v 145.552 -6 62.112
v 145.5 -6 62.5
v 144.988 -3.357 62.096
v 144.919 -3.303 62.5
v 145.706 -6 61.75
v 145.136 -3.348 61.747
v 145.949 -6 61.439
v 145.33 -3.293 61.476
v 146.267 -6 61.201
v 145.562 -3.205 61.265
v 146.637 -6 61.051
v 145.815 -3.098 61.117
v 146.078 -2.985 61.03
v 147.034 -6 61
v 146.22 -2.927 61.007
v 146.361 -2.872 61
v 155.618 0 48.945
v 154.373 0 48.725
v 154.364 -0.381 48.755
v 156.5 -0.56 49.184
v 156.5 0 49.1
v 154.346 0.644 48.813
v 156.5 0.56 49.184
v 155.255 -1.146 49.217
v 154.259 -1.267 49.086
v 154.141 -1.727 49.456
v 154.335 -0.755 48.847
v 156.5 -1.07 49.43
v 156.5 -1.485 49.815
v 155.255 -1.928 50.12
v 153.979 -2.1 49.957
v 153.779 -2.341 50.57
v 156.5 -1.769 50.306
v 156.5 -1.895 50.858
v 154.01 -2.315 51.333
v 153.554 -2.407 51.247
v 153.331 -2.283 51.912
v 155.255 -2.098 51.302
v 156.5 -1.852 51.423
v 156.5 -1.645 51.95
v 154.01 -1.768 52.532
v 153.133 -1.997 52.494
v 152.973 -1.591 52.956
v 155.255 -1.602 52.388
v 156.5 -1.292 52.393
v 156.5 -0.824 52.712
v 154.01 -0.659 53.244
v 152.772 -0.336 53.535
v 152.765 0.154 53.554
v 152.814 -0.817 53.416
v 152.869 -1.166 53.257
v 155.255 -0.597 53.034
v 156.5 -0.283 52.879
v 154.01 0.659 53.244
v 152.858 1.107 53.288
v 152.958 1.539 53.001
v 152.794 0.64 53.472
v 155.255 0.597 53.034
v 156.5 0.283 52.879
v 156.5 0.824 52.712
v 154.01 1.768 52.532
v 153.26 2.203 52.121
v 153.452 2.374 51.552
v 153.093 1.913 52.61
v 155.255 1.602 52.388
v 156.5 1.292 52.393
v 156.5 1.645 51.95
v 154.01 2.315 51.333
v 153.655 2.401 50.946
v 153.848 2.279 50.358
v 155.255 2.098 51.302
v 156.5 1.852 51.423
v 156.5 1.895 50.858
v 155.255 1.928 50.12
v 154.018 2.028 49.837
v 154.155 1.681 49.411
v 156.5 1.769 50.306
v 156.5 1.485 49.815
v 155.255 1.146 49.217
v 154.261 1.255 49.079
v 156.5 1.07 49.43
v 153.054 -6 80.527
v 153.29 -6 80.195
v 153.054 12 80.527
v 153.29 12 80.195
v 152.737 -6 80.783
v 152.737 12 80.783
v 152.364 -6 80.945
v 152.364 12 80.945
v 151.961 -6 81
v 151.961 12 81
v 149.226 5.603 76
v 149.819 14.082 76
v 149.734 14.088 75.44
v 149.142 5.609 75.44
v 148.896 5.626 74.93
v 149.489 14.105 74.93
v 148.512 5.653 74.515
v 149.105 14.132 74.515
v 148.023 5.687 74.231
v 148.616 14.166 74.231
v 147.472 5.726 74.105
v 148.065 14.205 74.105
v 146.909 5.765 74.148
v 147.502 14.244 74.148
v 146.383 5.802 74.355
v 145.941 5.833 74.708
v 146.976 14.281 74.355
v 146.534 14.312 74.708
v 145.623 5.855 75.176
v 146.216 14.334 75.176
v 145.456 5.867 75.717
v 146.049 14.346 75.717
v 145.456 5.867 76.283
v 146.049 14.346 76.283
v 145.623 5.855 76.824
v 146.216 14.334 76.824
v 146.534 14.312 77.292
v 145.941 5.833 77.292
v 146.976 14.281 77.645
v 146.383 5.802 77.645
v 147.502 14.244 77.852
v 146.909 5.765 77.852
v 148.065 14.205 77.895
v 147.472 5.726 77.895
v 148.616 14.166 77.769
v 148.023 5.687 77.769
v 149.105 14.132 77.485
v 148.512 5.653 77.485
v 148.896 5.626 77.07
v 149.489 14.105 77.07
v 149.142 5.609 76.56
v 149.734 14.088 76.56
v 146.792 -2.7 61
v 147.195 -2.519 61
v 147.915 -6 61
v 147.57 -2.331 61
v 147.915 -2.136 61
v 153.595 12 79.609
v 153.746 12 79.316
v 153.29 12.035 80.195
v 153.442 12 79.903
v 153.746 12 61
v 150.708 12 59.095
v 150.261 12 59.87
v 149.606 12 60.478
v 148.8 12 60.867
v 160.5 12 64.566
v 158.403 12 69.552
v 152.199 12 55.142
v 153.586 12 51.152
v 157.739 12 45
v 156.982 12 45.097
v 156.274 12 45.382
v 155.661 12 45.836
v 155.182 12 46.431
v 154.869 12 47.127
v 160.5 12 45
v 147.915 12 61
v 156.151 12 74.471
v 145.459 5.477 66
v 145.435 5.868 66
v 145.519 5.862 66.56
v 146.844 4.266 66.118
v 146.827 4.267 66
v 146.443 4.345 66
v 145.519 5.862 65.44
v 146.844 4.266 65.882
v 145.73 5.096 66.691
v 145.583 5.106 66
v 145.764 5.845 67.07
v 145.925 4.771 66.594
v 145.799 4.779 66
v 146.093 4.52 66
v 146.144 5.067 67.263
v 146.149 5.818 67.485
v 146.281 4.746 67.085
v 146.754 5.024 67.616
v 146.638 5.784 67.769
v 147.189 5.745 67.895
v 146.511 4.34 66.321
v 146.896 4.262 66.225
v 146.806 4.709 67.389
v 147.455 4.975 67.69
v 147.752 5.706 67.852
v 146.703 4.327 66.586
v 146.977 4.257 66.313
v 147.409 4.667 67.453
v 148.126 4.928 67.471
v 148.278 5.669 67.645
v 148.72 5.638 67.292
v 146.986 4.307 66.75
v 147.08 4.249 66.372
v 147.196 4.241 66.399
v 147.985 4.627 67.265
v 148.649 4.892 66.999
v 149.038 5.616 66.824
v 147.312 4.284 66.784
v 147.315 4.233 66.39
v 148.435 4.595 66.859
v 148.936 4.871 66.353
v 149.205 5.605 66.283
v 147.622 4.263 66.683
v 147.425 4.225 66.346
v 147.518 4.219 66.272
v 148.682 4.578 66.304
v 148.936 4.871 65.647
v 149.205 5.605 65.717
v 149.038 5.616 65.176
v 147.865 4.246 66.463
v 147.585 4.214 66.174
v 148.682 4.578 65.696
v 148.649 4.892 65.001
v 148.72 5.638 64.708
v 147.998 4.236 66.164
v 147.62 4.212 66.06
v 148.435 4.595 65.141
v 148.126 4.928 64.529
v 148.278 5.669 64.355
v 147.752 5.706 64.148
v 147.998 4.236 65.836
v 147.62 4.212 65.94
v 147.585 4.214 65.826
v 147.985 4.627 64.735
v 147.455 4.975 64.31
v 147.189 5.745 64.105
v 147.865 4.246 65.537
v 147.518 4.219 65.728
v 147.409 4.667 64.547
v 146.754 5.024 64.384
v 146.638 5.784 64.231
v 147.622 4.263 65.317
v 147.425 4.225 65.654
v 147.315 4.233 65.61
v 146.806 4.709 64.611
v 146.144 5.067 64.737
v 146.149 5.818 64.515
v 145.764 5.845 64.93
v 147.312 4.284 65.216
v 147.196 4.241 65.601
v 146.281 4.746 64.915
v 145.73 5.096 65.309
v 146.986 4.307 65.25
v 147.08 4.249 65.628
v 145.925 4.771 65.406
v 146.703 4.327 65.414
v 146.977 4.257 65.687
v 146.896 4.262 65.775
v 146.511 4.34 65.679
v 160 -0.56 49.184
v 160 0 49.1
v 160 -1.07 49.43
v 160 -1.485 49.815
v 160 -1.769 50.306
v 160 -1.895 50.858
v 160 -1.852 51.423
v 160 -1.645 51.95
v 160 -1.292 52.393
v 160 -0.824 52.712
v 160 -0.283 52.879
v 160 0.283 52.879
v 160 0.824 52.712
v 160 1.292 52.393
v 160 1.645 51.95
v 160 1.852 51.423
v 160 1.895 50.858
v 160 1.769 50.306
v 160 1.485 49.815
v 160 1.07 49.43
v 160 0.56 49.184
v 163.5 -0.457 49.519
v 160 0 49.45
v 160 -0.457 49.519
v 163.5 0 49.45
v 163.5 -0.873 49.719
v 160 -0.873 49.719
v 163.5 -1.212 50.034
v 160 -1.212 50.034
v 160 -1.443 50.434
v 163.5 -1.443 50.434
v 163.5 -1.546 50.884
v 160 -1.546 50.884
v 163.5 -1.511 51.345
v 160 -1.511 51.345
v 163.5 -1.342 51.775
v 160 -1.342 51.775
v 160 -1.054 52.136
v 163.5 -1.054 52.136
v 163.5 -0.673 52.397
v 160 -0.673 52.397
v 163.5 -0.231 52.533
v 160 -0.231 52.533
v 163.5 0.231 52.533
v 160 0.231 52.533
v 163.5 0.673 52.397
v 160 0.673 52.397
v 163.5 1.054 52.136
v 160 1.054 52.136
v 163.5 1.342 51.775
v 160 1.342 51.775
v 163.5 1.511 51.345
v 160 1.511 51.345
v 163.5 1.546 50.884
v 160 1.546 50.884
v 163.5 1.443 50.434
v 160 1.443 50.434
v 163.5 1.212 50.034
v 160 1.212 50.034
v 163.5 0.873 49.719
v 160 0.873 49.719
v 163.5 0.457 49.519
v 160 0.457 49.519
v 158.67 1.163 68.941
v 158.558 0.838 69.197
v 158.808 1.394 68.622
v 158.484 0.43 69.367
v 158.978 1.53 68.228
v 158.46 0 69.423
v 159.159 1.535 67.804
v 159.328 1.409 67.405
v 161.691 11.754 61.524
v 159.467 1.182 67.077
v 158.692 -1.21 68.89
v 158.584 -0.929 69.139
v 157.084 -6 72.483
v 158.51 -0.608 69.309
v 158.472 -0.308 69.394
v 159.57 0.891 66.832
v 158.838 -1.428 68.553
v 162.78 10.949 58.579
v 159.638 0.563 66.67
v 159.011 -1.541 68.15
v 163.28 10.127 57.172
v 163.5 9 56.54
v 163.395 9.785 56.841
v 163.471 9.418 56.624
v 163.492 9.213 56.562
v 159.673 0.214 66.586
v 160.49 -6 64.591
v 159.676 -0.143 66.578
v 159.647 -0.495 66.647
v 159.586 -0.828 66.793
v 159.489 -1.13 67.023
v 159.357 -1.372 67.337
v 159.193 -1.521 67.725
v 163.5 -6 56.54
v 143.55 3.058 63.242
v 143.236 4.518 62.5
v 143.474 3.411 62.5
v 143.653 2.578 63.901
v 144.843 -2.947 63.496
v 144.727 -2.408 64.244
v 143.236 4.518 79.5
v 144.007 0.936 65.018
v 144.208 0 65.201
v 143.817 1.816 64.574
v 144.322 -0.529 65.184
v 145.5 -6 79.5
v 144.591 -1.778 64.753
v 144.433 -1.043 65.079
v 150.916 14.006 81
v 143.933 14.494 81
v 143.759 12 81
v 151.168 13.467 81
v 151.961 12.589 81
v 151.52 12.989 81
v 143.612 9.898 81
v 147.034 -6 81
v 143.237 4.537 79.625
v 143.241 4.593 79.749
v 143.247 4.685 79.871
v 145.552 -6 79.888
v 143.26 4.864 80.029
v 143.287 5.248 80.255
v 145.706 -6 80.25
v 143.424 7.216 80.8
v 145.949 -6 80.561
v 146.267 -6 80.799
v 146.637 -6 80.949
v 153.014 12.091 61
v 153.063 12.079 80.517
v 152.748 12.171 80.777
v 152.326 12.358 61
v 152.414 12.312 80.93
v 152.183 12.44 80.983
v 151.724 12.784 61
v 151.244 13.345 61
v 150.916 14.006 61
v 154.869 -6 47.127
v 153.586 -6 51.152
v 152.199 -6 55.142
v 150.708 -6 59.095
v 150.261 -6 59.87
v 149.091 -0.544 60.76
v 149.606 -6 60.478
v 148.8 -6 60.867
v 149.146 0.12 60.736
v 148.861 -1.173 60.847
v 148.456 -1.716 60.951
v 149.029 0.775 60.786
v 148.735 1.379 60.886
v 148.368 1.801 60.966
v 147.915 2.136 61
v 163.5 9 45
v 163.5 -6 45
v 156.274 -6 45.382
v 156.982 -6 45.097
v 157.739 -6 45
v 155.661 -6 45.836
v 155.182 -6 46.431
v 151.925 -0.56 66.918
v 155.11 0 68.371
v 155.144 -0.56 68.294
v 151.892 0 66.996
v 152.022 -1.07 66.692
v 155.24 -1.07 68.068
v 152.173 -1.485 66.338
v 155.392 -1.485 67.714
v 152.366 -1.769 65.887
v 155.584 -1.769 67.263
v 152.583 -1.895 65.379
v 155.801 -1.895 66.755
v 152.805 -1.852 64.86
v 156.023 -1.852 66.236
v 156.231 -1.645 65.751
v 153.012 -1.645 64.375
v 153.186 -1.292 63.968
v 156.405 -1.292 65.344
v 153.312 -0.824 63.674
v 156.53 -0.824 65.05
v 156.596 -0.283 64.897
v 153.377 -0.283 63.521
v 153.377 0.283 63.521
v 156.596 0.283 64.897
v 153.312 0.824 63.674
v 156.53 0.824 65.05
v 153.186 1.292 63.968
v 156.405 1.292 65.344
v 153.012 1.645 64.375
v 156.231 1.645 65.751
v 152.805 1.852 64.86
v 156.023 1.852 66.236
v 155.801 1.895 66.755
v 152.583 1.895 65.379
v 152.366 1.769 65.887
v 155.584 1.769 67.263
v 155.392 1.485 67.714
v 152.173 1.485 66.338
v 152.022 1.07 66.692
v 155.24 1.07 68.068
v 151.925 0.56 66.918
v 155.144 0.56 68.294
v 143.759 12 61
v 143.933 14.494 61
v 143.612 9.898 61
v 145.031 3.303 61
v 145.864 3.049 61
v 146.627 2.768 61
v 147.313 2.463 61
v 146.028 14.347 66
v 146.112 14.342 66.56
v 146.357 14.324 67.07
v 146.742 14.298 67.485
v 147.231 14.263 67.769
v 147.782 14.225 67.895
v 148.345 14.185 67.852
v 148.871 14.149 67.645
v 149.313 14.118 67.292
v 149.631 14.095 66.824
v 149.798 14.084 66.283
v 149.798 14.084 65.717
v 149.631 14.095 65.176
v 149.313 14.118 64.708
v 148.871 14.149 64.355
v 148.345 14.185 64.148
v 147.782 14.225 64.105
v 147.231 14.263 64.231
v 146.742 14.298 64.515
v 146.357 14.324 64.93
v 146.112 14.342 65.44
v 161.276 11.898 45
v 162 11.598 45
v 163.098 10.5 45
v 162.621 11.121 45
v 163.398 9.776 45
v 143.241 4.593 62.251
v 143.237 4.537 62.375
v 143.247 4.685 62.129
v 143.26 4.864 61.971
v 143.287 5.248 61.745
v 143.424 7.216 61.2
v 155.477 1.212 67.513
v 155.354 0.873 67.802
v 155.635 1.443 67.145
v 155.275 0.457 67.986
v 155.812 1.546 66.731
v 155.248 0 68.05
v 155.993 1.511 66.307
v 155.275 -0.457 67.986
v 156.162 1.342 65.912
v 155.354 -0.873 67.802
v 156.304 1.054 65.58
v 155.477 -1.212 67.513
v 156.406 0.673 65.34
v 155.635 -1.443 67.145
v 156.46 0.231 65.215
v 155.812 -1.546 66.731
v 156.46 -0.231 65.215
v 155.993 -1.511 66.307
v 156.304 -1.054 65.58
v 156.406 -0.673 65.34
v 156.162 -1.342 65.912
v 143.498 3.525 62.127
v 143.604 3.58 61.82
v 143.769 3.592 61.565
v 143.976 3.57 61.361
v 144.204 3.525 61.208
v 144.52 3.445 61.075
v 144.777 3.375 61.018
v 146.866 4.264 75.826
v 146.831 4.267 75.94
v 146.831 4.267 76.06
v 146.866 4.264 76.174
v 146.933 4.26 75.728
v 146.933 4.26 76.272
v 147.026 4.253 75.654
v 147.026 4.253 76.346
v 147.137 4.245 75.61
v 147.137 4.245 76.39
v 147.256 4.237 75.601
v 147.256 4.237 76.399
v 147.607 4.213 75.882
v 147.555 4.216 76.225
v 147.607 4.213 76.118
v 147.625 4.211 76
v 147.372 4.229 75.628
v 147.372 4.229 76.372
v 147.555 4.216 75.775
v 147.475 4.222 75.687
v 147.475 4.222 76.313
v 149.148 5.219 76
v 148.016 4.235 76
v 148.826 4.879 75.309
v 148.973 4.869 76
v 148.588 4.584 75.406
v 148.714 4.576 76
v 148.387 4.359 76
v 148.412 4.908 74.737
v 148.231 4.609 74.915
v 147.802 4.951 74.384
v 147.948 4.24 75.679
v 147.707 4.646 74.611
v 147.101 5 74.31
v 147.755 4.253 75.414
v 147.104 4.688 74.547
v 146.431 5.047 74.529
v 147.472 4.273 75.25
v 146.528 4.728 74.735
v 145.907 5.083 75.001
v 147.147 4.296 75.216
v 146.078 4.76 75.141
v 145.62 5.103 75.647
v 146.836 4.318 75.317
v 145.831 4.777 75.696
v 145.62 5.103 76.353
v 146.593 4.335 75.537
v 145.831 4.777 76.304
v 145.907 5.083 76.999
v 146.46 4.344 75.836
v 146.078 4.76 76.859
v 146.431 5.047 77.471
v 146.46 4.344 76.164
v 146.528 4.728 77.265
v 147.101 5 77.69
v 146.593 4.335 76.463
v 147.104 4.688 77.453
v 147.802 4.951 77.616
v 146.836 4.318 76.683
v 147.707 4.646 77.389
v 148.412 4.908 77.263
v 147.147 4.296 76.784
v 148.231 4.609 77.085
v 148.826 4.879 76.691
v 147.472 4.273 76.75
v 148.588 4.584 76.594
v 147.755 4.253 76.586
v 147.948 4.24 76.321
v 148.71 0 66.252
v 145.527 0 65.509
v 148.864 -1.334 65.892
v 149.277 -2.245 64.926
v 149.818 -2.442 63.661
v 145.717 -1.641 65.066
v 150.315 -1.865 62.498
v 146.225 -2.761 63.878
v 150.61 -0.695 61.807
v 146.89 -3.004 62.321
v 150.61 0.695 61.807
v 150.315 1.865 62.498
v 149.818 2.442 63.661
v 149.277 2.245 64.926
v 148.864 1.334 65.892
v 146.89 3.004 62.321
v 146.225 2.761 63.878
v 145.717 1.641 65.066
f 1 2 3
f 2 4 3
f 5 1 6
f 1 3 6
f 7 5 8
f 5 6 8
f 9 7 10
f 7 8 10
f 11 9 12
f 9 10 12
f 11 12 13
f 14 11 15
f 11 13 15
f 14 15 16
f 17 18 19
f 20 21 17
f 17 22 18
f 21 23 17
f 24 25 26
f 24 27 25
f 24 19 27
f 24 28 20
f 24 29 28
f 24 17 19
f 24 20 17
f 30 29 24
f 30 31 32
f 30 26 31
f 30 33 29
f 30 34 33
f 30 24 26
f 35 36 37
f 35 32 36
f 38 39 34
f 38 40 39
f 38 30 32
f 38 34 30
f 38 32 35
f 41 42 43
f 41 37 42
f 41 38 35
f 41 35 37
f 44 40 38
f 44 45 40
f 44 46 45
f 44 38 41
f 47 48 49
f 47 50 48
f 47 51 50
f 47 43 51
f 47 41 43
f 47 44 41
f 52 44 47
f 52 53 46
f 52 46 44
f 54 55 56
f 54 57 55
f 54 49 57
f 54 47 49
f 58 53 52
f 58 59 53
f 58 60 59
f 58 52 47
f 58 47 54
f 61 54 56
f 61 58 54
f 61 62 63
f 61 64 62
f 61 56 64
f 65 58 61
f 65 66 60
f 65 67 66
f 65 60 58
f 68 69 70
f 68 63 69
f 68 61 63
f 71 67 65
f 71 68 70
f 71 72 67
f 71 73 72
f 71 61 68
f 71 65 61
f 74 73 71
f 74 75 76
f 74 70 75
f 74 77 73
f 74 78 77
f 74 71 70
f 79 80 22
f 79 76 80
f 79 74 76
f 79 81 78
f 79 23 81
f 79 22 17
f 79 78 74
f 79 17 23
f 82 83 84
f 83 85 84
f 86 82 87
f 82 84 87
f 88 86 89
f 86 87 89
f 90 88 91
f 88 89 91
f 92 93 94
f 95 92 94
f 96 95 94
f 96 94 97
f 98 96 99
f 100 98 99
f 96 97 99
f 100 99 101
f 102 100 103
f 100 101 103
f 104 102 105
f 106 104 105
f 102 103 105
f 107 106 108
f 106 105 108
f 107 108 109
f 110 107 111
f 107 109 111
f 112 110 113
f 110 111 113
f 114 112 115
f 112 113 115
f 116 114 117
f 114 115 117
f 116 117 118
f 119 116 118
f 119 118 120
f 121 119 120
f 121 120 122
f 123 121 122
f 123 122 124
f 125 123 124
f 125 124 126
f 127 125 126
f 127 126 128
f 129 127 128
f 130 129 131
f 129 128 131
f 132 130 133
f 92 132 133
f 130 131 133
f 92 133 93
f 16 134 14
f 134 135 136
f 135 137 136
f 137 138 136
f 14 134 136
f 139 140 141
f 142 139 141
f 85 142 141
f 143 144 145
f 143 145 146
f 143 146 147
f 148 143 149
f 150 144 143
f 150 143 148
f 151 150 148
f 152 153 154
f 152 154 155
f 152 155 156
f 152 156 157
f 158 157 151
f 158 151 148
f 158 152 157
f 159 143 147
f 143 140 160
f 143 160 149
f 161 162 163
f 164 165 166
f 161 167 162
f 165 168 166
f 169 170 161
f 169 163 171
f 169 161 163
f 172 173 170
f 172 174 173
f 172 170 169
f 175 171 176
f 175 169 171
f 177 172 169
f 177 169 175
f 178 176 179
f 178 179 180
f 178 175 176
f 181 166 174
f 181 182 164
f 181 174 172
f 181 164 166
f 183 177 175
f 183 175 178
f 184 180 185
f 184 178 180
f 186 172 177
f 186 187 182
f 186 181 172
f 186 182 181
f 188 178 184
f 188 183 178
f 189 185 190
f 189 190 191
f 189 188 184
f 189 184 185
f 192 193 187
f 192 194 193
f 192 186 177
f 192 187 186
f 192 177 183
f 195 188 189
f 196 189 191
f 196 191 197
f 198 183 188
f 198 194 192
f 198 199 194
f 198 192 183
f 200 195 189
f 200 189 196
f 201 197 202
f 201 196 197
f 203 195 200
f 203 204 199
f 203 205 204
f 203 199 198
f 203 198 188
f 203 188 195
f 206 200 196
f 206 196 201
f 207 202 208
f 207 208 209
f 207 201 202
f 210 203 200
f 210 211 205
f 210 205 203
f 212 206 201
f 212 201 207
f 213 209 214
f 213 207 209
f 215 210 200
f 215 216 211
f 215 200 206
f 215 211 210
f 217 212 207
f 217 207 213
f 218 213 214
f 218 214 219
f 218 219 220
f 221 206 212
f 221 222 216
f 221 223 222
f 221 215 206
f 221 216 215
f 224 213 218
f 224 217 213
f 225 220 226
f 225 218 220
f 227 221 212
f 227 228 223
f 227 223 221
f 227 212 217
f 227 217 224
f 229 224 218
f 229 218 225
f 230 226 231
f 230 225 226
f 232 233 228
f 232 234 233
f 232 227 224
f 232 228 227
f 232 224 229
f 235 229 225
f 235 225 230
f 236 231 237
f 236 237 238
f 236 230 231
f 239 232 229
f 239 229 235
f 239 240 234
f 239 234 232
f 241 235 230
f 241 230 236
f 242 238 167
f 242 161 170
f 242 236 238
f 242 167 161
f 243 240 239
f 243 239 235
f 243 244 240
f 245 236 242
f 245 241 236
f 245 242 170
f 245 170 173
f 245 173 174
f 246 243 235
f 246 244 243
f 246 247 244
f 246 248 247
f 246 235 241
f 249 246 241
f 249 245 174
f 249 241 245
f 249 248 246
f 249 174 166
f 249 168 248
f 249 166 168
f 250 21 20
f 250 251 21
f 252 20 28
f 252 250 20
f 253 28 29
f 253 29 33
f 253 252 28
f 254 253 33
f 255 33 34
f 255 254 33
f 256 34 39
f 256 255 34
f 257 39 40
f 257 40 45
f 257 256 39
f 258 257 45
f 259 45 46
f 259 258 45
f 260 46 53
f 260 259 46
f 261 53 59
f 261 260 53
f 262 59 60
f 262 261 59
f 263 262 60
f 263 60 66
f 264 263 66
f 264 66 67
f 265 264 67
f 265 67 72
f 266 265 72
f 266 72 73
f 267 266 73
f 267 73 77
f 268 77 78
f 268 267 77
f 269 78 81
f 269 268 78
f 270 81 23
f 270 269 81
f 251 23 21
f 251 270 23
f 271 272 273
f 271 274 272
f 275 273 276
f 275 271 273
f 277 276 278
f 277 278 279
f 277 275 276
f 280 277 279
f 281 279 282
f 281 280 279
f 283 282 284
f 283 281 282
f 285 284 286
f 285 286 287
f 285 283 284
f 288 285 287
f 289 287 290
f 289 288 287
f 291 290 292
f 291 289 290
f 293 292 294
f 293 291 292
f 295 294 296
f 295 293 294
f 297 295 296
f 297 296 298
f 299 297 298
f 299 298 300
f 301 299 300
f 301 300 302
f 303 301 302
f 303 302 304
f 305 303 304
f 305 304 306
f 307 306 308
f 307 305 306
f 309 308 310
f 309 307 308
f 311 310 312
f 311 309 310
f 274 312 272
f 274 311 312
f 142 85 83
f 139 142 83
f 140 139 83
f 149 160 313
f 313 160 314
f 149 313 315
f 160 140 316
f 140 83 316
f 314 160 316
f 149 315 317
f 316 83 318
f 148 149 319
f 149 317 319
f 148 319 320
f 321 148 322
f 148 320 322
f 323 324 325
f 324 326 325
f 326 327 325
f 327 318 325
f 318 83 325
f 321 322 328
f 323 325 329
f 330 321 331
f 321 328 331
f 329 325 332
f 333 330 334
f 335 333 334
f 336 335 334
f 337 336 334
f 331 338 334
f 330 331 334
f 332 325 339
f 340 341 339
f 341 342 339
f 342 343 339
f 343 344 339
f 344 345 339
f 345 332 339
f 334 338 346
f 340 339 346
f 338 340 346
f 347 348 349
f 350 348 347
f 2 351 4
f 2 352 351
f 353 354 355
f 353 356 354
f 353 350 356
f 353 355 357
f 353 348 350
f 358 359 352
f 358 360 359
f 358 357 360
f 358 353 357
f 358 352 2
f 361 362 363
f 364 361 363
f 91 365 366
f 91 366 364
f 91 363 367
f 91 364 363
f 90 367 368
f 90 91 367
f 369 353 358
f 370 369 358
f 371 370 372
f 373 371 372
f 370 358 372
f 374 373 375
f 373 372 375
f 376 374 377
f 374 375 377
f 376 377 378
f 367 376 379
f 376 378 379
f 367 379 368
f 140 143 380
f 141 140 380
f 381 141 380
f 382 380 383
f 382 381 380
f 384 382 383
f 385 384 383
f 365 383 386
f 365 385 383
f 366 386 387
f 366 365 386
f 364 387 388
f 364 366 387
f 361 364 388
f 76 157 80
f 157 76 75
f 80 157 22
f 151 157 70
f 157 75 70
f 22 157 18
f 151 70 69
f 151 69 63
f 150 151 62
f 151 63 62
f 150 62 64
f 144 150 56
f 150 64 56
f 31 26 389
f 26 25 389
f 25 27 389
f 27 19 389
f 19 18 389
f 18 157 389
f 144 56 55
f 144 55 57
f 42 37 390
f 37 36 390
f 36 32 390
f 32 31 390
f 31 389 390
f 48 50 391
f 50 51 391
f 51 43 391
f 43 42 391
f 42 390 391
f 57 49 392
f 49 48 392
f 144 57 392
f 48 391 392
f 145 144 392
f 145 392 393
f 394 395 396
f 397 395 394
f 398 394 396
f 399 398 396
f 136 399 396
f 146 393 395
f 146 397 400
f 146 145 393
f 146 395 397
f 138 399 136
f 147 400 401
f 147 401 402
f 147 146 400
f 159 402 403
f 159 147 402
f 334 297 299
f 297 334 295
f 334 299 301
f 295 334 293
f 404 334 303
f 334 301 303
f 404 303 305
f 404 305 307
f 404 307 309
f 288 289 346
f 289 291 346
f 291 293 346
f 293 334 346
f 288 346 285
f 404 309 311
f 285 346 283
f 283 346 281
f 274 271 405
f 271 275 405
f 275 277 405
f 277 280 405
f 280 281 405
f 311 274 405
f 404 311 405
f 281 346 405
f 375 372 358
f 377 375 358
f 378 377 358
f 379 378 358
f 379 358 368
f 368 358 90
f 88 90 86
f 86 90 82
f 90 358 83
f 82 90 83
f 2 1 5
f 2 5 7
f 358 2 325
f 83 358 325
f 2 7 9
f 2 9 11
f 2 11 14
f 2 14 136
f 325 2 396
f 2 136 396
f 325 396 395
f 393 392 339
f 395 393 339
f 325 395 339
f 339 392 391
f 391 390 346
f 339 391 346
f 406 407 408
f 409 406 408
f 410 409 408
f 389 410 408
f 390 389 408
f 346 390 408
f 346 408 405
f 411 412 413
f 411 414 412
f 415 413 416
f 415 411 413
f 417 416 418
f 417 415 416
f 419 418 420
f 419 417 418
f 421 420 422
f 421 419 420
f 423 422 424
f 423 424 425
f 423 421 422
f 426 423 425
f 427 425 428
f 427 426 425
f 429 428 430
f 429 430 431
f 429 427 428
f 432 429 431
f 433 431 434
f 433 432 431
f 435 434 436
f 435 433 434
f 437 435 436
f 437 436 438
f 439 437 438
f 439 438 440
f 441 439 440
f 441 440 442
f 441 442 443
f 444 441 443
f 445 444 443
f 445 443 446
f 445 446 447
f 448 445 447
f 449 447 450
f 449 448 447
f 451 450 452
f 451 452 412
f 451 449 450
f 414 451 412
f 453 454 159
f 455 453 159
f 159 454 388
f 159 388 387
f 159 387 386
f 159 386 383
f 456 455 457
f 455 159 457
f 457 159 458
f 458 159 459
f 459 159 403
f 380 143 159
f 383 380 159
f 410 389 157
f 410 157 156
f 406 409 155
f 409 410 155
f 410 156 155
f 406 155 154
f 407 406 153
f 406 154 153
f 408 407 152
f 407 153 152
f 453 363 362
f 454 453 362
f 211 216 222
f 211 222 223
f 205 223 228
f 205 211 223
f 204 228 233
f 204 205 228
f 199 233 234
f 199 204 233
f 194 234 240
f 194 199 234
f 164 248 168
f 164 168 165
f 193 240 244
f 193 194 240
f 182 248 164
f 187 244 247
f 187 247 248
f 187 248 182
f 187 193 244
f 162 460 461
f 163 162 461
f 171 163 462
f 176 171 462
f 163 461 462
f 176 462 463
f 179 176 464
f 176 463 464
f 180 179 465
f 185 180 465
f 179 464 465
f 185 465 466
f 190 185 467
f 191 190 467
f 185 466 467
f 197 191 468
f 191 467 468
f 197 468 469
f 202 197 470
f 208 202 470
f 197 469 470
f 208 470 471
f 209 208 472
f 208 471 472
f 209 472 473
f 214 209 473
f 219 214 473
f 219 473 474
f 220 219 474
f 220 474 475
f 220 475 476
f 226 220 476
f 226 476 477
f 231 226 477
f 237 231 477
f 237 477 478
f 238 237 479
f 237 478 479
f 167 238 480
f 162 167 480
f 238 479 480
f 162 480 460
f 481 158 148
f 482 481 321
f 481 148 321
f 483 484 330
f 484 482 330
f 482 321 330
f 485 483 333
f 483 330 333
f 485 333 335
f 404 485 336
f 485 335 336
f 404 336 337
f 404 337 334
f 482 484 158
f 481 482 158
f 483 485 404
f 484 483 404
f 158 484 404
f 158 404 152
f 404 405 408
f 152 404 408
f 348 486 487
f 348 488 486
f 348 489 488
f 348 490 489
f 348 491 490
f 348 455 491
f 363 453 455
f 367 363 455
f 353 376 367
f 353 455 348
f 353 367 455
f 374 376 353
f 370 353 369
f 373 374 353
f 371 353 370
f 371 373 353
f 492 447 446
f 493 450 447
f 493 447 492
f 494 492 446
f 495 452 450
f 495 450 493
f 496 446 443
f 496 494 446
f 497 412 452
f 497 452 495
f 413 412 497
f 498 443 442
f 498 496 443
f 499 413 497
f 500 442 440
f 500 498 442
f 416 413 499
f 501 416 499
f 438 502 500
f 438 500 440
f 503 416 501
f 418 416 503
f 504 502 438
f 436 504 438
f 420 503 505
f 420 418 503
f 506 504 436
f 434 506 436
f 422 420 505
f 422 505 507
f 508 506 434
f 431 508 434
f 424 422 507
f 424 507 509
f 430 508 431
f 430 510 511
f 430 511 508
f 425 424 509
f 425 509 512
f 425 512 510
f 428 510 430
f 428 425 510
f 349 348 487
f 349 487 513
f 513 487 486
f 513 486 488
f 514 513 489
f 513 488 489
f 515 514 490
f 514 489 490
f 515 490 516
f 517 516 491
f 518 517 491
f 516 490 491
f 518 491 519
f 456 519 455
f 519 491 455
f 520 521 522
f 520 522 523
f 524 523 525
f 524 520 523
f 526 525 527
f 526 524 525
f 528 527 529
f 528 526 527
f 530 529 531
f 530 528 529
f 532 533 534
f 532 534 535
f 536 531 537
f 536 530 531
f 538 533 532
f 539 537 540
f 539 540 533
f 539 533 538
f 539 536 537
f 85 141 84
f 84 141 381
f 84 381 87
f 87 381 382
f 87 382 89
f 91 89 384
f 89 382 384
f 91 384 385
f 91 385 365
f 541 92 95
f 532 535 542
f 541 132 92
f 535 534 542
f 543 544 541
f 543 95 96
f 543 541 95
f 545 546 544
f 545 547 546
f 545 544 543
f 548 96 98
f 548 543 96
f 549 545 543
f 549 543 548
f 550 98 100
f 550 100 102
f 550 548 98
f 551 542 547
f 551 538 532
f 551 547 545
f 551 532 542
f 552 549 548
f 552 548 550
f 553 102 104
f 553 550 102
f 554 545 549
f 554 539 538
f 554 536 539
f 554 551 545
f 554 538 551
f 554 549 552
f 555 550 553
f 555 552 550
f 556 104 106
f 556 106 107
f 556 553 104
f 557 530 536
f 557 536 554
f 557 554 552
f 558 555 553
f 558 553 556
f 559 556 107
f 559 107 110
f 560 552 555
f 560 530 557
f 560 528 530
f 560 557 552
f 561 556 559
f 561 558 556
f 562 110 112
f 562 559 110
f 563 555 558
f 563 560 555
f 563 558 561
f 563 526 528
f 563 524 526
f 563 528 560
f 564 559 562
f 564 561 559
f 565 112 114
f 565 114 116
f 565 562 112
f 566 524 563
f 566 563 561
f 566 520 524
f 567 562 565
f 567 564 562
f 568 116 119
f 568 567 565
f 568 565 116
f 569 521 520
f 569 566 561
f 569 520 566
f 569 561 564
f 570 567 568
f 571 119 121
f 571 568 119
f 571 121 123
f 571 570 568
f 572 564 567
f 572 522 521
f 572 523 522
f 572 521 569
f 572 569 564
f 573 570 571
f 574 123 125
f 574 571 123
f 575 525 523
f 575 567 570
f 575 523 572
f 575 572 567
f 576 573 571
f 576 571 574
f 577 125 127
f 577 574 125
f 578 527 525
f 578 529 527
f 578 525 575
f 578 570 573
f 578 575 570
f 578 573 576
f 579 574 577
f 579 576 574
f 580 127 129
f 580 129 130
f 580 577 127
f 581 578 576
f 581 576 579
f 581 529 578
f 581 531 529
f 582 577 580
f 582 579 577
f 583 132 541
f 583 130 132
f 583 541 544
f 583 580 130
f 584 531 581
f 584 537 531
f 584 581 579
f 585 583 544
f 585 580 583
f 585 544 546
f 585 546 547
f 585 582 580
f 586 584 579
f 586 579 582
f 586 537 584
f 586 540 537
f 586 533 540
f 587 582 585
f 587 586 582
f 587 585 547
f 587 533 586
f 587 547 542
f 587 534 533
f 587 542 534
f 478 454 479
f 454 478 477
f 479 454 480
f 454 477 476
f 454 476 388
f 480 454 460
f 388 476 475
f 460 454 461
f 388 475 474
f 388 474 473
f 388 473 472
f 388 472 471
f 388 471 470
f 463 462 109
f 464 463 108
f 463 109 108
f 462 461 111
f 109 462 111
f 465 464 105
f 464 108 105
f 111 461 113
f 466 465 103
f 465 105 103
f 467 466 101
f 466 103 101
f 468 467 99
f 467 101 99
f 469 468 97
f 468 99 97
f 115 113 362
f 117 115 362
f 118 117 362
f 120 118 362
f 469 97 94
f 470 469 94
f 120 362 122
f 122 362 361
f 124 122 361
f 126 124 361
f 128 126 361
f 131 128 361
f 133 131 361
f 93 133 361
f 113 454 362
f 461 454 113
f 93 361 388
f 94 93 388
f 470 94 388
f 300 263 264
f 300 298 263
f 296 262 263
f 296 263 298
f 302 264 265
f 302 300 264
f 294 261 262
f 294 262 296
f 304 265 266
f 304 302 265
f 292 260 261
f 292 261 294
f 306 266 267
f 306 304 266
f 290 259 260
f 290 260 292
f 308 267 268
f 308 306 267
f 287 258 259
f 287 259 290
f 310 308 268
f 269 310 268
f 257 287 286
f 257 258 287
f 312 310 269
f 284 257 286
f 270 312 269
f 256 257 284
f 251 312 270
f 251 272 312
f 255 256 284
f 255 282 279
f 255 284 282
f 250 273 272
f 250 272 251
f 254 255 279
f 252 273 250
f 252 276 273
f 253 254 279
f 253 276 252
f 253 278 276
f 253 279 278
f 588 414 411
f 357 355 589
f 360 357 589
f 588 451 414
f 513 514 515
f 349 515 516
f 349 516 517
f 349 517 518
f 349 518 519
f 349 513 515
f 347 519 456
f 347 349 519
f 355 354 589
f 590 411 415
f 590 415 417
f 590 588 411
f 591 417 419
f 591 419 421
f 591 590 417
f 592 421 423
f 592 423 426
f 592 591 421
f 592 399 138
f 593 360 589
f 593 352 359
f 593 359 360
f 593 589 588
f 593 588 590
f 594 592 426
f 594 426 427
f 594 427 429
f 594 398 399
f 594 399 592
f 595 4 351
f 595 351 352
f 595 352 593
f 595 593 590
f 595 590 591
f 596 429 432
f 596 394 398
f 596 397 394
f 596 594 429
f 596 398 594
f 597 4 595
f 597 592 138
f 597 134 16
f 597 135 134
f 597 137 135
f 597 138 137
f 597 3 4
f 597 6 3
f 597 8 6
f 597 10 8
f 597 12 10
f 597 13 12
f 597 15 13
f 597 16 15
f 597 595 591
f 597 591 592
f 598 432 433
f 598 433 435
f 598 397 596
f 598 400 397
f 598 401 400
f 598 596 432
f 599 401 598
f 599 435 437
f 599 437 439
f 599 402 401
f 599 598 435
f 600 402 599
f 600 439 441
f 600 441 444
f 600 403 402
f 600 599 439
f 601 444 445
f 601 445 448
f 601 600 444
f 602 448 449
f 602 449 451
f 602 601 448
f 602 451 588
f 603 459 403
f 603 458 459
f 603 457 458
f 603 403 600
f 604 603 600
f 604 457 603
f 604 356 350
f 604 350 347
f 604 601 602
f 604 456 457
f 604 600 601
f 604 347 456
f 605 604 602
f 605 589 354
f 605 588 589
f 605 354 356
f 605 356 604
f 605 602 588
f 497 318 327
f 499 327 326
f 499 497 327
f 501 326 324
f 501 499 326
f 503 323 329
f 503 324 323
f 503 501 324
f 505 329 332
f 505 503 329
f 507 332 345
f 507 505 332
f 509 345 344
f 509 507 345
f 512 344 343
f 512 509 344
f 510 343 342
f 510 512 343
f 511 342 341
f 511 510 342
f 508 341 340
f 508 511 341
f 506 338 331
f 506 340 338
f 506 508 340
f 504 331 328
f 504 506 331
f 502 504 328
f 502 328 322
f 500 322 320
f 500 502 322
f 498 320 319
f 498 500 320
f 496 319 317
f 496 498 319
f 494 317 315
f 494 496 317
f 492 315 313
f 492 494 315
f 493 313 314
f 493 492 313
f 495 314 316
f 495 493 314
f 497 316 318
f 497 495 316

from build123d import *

# Parameters (mm, degrees)
BOSS_EXTRU_1_DEPTH      = 12
BOSS_EXTRU_1_DEPTH_BACK = 6
ENL_V_MAT_EXTRU_1_DEPTH = 168.845911478
BOSS_EXTRU_2_DEPTH      = 20
ENL_V_MAT_EXTRU_2_DEPTH = 169.042623851
ESQUISSE5_R             = 1.9
ENL_V_MAT_EXTRU_3_DEPTH = 10
CONG_1_R                = 3
CONG_2_R                = 1.5


with BuildPart() as part:
    # Esquisse1 → Boss.-Extru.1 (new, two sides: drawn at the far end of the back side and taken through both)
    with BuildSketch(Plane(origin=(0, 0, 0), x_dir=(1, 0, 0), z_dir=(0, 1, 0)).offset(-BOSS_EXTRU_1_DEPTH_BACK)):
        with BuildLine():
            Line((142.5, -81), (152.865954352, -81))
            ThreePointArc((152.865954352, -81), (158.655064541, -68.975144042), (163.5, -56.539808984))
            Line((163.5, -56.539808984), (163.5, -45))
            Line((163.5, -45), (155.5, -45))
            ThreePointArc((155.5, -45), (152.933130519, -53.072663298), (149.947490809, -61))
            Line((149.947490809, -61), (142.5, -61))
            Line((142.5, -61), (142.5, -81))
        make_face()
    extrude(amount=BOSS_EXTRU_1_DEPTH + BOSS_EXTRU_1_DEPTH_BACK)

    # Esquisse2 → Enlèv. mat.-Extru.1 (cut, through all)
    with BuildSketch(Plane.XY.offset(81)):
        Polygon((142.5, -6), (142.5, 12), (143.758682615, 12), align=None)
    extrude(amount=-ENL_V_MAT_EXTRU_1_DEPTH, mode=Mode.SUBTRACT)

    # Esquisse3 → Boss.-Extru.2 (add)
    with BuildSketch(Plane.XY.offset(81)):
        Polygon((143.758682615, 12), (143.933073799, 14.493910126), (150.916022151, 14.005614809), (150.916022151, 12), align=None)
    extrude(amount=-BOSS_EXTRU_2_DEPTH)

    # Esquisse4 → Enlèv. mat.-Extru.2 (cut, through all)
    with BuildSketch(Plane.XY.offset(81)):
        Polygon((142.5, -6), (143.235509062, 4.518269623), (145.5, -6), align=None)
    extrude(amount=-ENL_V_MAT_EXTRU_2_DEPTH, mode=Mode.SUBTRACT)

    # Esquisse5 → Enlèv. mat.-Extru.3 (cut)
    with BuildSketch(Plane(origin=(1.708954599, 24.439189363, 0), x_dir=(0.9975640502598248, -0.06975647374411768, 0), z_dir=(0.06975647374411768, 0.9975640502598248, 0))):
        with Locations(Location((146.571416004, -66, 0), (0, 0, 180))):
            Circle(ESQUISSE5_R)
        with Locations((146.571416004, -76)):
            Circle(ESQUISSE5_R)
    extrude(amount=-ENL_V_MAT_EXTRU_3_DEPTH, mode=Mode.SUBTRACT)

    # Esquisse7 → Enlèvement de matière-Révolution1 (revolve, cut)
    with BuildSketch(Plane(origin=(0, 0, 0), x_dir=(1, 0, 0), z_dir=(0, 1, 0)), mode=Mode.PRIVATE) as enl_vement_de_mati_re_r_volution1_sk:
        Polygon((156.5, -52.9), (160, -52.9), (160, -52.55), (163.5, -52.55), (163.5, -51), (150.916022151, -51), (150.916022151, -53.884605954), align=None)
    revolve(enl_vement_de_mati_re_r_volution1_sk.sketch.rotate(Axis((150.916022151, 0, 51), (-1, 0, 0)), 180), axis=Axis((150.916022151, 0, 51), (-1, 0, 0)), mode=Mode.SUBTRACT)

    # Congé1
    # the kernel refuses this fillet: 3 mm, written as the material it adds along each edge
    with BuildSketch(Plane(origin=(150.916022151, 12, 81), x_dir=(0, 1, 0), z_dir=(0, 0, -1))) as cong_1_piece_1_section:
        with BuildLine():
            CenterArc((3, 2.830405994), CONG_1_R, 180, 70.642479406)
            Line((0, 2.830405994), (0, 0))
            Line((0, 0), (2.005614809, 0))
        make_face()
    cong_1_piece_1 = extrude(amount=20, mode=Mode.PRIVATE)
    cong_1_piece_1 = cong_1_piece_1 & Plane(origin=(0, 12, 0), x_dir=(0.8836182332495415, 0, 0.46820809248555173), z_dir=(0, -1, 0)) * Cylinder(173, 52, mode=Mode.PRIVATE)
    add(cong_1_piece_1)
    with BuildSketch(Plane(origin=(149.947490809, 12, 61), x_dir=(-1, 0, 0), z_dir=(0, -1, 0))) as cong_1_piece_2:
        with BuildLine():
            CenterArc((2.032083033, 3), CONG_1_R, 201.410940908, 68.589059092)
            ThreePointArc((-0.760875339, 1.904836298), (-0.383454711, 0.95121301), (0, 0))
            Line((0, 0), (2.032083033, 0))
        make_face()
    extrude(amount=18)
    # the kernel refuses this fillet: 3 mm, written as the material it takes off along each edge
    with BuildSketch(Plane(origin=(163.5, 12, 69.289808984), x_dir=(0, -1, 0), z_dir=(0, 0, -1))) as cong_1_2_piece_1:
        with BuildLine():
            CenterArc((CONG_1_R, CONG_1_R), CONG_1_R, 180, 90)
            Line((0, CONG_1_R), (0, 0))
            Line((0, 0), (CONG_1_R, 0))
        make_face()
    extrude(amount=31.789808984, mode=Mode.SUBTRACT)
    with BuildSketch(Plane(origin=(155.5, 17.5970247, 45), x_dir=(-0.2845583113069487, 0, 0.9586587335783978), z_dir=(0, -1, 0))) as cong_1_2_piece_2:
        with BuildLine():
            CenterArc((2.238904242, -2.999929578), CONG_1_R, 90.392583202, 73.074968252)
            Line((-0.637071959, -2.146254644), (0, 0))
            ThreePointArc((0, 0), (1.109174397, -0.003799974), (2.218348794, 0))
        make_face()
    extrude(amount=29.194049399, mode=Mode.SUBTRACT)

    # Esquisse8 → Enlèvement de matière-Révolution2 (revolve, cut)
    with BuildSketch(Plane(origin=(0, 0, 0), x_dir=(1, 0, 0), z_dir=(0, 1, 0)), mode=Mode.PRIVATE) as enl_vement_de_mati_re_r_volution2_sk:
        Polygon((143.15277955, -61.193532862), (159.075453795, -68), (159.68470235, -66.574757495), (156.466412822, -65.199034952), (156.603985076, -64.877205999), (153.385695549, -63.501483455), (144.614610154, -57.773806881), align=None)
    revolve(enl_vement_de_mati_re_r_volution2_sk.sketch.rotate(Axis((0, 0, 0), (0.9195112936111692, 0, 0.3930635838150288)), 180), axis=Axis((0, 0, 0), (0.9195112936111692, 0, 0.3930635838150288)), mode=Mode.SUBTRACT)

    # Congé2
    cong_2_edges = [part.edges().sort_by_distance(p)[0] for p in [
        (145.330393567, 4.371781028, 76),
        (149.121136958, 4.106706428, 66),
        (143.325850505, 4.098645221, 61),
        (144.367754531, -0.740865188, 81),
        (145.212814743, -4.66606136, 61),
        (152.865954352, 3, 81),
    ]]
    fillet(cong_2_edges, radius=CONG_2_R)


solid = part.part
